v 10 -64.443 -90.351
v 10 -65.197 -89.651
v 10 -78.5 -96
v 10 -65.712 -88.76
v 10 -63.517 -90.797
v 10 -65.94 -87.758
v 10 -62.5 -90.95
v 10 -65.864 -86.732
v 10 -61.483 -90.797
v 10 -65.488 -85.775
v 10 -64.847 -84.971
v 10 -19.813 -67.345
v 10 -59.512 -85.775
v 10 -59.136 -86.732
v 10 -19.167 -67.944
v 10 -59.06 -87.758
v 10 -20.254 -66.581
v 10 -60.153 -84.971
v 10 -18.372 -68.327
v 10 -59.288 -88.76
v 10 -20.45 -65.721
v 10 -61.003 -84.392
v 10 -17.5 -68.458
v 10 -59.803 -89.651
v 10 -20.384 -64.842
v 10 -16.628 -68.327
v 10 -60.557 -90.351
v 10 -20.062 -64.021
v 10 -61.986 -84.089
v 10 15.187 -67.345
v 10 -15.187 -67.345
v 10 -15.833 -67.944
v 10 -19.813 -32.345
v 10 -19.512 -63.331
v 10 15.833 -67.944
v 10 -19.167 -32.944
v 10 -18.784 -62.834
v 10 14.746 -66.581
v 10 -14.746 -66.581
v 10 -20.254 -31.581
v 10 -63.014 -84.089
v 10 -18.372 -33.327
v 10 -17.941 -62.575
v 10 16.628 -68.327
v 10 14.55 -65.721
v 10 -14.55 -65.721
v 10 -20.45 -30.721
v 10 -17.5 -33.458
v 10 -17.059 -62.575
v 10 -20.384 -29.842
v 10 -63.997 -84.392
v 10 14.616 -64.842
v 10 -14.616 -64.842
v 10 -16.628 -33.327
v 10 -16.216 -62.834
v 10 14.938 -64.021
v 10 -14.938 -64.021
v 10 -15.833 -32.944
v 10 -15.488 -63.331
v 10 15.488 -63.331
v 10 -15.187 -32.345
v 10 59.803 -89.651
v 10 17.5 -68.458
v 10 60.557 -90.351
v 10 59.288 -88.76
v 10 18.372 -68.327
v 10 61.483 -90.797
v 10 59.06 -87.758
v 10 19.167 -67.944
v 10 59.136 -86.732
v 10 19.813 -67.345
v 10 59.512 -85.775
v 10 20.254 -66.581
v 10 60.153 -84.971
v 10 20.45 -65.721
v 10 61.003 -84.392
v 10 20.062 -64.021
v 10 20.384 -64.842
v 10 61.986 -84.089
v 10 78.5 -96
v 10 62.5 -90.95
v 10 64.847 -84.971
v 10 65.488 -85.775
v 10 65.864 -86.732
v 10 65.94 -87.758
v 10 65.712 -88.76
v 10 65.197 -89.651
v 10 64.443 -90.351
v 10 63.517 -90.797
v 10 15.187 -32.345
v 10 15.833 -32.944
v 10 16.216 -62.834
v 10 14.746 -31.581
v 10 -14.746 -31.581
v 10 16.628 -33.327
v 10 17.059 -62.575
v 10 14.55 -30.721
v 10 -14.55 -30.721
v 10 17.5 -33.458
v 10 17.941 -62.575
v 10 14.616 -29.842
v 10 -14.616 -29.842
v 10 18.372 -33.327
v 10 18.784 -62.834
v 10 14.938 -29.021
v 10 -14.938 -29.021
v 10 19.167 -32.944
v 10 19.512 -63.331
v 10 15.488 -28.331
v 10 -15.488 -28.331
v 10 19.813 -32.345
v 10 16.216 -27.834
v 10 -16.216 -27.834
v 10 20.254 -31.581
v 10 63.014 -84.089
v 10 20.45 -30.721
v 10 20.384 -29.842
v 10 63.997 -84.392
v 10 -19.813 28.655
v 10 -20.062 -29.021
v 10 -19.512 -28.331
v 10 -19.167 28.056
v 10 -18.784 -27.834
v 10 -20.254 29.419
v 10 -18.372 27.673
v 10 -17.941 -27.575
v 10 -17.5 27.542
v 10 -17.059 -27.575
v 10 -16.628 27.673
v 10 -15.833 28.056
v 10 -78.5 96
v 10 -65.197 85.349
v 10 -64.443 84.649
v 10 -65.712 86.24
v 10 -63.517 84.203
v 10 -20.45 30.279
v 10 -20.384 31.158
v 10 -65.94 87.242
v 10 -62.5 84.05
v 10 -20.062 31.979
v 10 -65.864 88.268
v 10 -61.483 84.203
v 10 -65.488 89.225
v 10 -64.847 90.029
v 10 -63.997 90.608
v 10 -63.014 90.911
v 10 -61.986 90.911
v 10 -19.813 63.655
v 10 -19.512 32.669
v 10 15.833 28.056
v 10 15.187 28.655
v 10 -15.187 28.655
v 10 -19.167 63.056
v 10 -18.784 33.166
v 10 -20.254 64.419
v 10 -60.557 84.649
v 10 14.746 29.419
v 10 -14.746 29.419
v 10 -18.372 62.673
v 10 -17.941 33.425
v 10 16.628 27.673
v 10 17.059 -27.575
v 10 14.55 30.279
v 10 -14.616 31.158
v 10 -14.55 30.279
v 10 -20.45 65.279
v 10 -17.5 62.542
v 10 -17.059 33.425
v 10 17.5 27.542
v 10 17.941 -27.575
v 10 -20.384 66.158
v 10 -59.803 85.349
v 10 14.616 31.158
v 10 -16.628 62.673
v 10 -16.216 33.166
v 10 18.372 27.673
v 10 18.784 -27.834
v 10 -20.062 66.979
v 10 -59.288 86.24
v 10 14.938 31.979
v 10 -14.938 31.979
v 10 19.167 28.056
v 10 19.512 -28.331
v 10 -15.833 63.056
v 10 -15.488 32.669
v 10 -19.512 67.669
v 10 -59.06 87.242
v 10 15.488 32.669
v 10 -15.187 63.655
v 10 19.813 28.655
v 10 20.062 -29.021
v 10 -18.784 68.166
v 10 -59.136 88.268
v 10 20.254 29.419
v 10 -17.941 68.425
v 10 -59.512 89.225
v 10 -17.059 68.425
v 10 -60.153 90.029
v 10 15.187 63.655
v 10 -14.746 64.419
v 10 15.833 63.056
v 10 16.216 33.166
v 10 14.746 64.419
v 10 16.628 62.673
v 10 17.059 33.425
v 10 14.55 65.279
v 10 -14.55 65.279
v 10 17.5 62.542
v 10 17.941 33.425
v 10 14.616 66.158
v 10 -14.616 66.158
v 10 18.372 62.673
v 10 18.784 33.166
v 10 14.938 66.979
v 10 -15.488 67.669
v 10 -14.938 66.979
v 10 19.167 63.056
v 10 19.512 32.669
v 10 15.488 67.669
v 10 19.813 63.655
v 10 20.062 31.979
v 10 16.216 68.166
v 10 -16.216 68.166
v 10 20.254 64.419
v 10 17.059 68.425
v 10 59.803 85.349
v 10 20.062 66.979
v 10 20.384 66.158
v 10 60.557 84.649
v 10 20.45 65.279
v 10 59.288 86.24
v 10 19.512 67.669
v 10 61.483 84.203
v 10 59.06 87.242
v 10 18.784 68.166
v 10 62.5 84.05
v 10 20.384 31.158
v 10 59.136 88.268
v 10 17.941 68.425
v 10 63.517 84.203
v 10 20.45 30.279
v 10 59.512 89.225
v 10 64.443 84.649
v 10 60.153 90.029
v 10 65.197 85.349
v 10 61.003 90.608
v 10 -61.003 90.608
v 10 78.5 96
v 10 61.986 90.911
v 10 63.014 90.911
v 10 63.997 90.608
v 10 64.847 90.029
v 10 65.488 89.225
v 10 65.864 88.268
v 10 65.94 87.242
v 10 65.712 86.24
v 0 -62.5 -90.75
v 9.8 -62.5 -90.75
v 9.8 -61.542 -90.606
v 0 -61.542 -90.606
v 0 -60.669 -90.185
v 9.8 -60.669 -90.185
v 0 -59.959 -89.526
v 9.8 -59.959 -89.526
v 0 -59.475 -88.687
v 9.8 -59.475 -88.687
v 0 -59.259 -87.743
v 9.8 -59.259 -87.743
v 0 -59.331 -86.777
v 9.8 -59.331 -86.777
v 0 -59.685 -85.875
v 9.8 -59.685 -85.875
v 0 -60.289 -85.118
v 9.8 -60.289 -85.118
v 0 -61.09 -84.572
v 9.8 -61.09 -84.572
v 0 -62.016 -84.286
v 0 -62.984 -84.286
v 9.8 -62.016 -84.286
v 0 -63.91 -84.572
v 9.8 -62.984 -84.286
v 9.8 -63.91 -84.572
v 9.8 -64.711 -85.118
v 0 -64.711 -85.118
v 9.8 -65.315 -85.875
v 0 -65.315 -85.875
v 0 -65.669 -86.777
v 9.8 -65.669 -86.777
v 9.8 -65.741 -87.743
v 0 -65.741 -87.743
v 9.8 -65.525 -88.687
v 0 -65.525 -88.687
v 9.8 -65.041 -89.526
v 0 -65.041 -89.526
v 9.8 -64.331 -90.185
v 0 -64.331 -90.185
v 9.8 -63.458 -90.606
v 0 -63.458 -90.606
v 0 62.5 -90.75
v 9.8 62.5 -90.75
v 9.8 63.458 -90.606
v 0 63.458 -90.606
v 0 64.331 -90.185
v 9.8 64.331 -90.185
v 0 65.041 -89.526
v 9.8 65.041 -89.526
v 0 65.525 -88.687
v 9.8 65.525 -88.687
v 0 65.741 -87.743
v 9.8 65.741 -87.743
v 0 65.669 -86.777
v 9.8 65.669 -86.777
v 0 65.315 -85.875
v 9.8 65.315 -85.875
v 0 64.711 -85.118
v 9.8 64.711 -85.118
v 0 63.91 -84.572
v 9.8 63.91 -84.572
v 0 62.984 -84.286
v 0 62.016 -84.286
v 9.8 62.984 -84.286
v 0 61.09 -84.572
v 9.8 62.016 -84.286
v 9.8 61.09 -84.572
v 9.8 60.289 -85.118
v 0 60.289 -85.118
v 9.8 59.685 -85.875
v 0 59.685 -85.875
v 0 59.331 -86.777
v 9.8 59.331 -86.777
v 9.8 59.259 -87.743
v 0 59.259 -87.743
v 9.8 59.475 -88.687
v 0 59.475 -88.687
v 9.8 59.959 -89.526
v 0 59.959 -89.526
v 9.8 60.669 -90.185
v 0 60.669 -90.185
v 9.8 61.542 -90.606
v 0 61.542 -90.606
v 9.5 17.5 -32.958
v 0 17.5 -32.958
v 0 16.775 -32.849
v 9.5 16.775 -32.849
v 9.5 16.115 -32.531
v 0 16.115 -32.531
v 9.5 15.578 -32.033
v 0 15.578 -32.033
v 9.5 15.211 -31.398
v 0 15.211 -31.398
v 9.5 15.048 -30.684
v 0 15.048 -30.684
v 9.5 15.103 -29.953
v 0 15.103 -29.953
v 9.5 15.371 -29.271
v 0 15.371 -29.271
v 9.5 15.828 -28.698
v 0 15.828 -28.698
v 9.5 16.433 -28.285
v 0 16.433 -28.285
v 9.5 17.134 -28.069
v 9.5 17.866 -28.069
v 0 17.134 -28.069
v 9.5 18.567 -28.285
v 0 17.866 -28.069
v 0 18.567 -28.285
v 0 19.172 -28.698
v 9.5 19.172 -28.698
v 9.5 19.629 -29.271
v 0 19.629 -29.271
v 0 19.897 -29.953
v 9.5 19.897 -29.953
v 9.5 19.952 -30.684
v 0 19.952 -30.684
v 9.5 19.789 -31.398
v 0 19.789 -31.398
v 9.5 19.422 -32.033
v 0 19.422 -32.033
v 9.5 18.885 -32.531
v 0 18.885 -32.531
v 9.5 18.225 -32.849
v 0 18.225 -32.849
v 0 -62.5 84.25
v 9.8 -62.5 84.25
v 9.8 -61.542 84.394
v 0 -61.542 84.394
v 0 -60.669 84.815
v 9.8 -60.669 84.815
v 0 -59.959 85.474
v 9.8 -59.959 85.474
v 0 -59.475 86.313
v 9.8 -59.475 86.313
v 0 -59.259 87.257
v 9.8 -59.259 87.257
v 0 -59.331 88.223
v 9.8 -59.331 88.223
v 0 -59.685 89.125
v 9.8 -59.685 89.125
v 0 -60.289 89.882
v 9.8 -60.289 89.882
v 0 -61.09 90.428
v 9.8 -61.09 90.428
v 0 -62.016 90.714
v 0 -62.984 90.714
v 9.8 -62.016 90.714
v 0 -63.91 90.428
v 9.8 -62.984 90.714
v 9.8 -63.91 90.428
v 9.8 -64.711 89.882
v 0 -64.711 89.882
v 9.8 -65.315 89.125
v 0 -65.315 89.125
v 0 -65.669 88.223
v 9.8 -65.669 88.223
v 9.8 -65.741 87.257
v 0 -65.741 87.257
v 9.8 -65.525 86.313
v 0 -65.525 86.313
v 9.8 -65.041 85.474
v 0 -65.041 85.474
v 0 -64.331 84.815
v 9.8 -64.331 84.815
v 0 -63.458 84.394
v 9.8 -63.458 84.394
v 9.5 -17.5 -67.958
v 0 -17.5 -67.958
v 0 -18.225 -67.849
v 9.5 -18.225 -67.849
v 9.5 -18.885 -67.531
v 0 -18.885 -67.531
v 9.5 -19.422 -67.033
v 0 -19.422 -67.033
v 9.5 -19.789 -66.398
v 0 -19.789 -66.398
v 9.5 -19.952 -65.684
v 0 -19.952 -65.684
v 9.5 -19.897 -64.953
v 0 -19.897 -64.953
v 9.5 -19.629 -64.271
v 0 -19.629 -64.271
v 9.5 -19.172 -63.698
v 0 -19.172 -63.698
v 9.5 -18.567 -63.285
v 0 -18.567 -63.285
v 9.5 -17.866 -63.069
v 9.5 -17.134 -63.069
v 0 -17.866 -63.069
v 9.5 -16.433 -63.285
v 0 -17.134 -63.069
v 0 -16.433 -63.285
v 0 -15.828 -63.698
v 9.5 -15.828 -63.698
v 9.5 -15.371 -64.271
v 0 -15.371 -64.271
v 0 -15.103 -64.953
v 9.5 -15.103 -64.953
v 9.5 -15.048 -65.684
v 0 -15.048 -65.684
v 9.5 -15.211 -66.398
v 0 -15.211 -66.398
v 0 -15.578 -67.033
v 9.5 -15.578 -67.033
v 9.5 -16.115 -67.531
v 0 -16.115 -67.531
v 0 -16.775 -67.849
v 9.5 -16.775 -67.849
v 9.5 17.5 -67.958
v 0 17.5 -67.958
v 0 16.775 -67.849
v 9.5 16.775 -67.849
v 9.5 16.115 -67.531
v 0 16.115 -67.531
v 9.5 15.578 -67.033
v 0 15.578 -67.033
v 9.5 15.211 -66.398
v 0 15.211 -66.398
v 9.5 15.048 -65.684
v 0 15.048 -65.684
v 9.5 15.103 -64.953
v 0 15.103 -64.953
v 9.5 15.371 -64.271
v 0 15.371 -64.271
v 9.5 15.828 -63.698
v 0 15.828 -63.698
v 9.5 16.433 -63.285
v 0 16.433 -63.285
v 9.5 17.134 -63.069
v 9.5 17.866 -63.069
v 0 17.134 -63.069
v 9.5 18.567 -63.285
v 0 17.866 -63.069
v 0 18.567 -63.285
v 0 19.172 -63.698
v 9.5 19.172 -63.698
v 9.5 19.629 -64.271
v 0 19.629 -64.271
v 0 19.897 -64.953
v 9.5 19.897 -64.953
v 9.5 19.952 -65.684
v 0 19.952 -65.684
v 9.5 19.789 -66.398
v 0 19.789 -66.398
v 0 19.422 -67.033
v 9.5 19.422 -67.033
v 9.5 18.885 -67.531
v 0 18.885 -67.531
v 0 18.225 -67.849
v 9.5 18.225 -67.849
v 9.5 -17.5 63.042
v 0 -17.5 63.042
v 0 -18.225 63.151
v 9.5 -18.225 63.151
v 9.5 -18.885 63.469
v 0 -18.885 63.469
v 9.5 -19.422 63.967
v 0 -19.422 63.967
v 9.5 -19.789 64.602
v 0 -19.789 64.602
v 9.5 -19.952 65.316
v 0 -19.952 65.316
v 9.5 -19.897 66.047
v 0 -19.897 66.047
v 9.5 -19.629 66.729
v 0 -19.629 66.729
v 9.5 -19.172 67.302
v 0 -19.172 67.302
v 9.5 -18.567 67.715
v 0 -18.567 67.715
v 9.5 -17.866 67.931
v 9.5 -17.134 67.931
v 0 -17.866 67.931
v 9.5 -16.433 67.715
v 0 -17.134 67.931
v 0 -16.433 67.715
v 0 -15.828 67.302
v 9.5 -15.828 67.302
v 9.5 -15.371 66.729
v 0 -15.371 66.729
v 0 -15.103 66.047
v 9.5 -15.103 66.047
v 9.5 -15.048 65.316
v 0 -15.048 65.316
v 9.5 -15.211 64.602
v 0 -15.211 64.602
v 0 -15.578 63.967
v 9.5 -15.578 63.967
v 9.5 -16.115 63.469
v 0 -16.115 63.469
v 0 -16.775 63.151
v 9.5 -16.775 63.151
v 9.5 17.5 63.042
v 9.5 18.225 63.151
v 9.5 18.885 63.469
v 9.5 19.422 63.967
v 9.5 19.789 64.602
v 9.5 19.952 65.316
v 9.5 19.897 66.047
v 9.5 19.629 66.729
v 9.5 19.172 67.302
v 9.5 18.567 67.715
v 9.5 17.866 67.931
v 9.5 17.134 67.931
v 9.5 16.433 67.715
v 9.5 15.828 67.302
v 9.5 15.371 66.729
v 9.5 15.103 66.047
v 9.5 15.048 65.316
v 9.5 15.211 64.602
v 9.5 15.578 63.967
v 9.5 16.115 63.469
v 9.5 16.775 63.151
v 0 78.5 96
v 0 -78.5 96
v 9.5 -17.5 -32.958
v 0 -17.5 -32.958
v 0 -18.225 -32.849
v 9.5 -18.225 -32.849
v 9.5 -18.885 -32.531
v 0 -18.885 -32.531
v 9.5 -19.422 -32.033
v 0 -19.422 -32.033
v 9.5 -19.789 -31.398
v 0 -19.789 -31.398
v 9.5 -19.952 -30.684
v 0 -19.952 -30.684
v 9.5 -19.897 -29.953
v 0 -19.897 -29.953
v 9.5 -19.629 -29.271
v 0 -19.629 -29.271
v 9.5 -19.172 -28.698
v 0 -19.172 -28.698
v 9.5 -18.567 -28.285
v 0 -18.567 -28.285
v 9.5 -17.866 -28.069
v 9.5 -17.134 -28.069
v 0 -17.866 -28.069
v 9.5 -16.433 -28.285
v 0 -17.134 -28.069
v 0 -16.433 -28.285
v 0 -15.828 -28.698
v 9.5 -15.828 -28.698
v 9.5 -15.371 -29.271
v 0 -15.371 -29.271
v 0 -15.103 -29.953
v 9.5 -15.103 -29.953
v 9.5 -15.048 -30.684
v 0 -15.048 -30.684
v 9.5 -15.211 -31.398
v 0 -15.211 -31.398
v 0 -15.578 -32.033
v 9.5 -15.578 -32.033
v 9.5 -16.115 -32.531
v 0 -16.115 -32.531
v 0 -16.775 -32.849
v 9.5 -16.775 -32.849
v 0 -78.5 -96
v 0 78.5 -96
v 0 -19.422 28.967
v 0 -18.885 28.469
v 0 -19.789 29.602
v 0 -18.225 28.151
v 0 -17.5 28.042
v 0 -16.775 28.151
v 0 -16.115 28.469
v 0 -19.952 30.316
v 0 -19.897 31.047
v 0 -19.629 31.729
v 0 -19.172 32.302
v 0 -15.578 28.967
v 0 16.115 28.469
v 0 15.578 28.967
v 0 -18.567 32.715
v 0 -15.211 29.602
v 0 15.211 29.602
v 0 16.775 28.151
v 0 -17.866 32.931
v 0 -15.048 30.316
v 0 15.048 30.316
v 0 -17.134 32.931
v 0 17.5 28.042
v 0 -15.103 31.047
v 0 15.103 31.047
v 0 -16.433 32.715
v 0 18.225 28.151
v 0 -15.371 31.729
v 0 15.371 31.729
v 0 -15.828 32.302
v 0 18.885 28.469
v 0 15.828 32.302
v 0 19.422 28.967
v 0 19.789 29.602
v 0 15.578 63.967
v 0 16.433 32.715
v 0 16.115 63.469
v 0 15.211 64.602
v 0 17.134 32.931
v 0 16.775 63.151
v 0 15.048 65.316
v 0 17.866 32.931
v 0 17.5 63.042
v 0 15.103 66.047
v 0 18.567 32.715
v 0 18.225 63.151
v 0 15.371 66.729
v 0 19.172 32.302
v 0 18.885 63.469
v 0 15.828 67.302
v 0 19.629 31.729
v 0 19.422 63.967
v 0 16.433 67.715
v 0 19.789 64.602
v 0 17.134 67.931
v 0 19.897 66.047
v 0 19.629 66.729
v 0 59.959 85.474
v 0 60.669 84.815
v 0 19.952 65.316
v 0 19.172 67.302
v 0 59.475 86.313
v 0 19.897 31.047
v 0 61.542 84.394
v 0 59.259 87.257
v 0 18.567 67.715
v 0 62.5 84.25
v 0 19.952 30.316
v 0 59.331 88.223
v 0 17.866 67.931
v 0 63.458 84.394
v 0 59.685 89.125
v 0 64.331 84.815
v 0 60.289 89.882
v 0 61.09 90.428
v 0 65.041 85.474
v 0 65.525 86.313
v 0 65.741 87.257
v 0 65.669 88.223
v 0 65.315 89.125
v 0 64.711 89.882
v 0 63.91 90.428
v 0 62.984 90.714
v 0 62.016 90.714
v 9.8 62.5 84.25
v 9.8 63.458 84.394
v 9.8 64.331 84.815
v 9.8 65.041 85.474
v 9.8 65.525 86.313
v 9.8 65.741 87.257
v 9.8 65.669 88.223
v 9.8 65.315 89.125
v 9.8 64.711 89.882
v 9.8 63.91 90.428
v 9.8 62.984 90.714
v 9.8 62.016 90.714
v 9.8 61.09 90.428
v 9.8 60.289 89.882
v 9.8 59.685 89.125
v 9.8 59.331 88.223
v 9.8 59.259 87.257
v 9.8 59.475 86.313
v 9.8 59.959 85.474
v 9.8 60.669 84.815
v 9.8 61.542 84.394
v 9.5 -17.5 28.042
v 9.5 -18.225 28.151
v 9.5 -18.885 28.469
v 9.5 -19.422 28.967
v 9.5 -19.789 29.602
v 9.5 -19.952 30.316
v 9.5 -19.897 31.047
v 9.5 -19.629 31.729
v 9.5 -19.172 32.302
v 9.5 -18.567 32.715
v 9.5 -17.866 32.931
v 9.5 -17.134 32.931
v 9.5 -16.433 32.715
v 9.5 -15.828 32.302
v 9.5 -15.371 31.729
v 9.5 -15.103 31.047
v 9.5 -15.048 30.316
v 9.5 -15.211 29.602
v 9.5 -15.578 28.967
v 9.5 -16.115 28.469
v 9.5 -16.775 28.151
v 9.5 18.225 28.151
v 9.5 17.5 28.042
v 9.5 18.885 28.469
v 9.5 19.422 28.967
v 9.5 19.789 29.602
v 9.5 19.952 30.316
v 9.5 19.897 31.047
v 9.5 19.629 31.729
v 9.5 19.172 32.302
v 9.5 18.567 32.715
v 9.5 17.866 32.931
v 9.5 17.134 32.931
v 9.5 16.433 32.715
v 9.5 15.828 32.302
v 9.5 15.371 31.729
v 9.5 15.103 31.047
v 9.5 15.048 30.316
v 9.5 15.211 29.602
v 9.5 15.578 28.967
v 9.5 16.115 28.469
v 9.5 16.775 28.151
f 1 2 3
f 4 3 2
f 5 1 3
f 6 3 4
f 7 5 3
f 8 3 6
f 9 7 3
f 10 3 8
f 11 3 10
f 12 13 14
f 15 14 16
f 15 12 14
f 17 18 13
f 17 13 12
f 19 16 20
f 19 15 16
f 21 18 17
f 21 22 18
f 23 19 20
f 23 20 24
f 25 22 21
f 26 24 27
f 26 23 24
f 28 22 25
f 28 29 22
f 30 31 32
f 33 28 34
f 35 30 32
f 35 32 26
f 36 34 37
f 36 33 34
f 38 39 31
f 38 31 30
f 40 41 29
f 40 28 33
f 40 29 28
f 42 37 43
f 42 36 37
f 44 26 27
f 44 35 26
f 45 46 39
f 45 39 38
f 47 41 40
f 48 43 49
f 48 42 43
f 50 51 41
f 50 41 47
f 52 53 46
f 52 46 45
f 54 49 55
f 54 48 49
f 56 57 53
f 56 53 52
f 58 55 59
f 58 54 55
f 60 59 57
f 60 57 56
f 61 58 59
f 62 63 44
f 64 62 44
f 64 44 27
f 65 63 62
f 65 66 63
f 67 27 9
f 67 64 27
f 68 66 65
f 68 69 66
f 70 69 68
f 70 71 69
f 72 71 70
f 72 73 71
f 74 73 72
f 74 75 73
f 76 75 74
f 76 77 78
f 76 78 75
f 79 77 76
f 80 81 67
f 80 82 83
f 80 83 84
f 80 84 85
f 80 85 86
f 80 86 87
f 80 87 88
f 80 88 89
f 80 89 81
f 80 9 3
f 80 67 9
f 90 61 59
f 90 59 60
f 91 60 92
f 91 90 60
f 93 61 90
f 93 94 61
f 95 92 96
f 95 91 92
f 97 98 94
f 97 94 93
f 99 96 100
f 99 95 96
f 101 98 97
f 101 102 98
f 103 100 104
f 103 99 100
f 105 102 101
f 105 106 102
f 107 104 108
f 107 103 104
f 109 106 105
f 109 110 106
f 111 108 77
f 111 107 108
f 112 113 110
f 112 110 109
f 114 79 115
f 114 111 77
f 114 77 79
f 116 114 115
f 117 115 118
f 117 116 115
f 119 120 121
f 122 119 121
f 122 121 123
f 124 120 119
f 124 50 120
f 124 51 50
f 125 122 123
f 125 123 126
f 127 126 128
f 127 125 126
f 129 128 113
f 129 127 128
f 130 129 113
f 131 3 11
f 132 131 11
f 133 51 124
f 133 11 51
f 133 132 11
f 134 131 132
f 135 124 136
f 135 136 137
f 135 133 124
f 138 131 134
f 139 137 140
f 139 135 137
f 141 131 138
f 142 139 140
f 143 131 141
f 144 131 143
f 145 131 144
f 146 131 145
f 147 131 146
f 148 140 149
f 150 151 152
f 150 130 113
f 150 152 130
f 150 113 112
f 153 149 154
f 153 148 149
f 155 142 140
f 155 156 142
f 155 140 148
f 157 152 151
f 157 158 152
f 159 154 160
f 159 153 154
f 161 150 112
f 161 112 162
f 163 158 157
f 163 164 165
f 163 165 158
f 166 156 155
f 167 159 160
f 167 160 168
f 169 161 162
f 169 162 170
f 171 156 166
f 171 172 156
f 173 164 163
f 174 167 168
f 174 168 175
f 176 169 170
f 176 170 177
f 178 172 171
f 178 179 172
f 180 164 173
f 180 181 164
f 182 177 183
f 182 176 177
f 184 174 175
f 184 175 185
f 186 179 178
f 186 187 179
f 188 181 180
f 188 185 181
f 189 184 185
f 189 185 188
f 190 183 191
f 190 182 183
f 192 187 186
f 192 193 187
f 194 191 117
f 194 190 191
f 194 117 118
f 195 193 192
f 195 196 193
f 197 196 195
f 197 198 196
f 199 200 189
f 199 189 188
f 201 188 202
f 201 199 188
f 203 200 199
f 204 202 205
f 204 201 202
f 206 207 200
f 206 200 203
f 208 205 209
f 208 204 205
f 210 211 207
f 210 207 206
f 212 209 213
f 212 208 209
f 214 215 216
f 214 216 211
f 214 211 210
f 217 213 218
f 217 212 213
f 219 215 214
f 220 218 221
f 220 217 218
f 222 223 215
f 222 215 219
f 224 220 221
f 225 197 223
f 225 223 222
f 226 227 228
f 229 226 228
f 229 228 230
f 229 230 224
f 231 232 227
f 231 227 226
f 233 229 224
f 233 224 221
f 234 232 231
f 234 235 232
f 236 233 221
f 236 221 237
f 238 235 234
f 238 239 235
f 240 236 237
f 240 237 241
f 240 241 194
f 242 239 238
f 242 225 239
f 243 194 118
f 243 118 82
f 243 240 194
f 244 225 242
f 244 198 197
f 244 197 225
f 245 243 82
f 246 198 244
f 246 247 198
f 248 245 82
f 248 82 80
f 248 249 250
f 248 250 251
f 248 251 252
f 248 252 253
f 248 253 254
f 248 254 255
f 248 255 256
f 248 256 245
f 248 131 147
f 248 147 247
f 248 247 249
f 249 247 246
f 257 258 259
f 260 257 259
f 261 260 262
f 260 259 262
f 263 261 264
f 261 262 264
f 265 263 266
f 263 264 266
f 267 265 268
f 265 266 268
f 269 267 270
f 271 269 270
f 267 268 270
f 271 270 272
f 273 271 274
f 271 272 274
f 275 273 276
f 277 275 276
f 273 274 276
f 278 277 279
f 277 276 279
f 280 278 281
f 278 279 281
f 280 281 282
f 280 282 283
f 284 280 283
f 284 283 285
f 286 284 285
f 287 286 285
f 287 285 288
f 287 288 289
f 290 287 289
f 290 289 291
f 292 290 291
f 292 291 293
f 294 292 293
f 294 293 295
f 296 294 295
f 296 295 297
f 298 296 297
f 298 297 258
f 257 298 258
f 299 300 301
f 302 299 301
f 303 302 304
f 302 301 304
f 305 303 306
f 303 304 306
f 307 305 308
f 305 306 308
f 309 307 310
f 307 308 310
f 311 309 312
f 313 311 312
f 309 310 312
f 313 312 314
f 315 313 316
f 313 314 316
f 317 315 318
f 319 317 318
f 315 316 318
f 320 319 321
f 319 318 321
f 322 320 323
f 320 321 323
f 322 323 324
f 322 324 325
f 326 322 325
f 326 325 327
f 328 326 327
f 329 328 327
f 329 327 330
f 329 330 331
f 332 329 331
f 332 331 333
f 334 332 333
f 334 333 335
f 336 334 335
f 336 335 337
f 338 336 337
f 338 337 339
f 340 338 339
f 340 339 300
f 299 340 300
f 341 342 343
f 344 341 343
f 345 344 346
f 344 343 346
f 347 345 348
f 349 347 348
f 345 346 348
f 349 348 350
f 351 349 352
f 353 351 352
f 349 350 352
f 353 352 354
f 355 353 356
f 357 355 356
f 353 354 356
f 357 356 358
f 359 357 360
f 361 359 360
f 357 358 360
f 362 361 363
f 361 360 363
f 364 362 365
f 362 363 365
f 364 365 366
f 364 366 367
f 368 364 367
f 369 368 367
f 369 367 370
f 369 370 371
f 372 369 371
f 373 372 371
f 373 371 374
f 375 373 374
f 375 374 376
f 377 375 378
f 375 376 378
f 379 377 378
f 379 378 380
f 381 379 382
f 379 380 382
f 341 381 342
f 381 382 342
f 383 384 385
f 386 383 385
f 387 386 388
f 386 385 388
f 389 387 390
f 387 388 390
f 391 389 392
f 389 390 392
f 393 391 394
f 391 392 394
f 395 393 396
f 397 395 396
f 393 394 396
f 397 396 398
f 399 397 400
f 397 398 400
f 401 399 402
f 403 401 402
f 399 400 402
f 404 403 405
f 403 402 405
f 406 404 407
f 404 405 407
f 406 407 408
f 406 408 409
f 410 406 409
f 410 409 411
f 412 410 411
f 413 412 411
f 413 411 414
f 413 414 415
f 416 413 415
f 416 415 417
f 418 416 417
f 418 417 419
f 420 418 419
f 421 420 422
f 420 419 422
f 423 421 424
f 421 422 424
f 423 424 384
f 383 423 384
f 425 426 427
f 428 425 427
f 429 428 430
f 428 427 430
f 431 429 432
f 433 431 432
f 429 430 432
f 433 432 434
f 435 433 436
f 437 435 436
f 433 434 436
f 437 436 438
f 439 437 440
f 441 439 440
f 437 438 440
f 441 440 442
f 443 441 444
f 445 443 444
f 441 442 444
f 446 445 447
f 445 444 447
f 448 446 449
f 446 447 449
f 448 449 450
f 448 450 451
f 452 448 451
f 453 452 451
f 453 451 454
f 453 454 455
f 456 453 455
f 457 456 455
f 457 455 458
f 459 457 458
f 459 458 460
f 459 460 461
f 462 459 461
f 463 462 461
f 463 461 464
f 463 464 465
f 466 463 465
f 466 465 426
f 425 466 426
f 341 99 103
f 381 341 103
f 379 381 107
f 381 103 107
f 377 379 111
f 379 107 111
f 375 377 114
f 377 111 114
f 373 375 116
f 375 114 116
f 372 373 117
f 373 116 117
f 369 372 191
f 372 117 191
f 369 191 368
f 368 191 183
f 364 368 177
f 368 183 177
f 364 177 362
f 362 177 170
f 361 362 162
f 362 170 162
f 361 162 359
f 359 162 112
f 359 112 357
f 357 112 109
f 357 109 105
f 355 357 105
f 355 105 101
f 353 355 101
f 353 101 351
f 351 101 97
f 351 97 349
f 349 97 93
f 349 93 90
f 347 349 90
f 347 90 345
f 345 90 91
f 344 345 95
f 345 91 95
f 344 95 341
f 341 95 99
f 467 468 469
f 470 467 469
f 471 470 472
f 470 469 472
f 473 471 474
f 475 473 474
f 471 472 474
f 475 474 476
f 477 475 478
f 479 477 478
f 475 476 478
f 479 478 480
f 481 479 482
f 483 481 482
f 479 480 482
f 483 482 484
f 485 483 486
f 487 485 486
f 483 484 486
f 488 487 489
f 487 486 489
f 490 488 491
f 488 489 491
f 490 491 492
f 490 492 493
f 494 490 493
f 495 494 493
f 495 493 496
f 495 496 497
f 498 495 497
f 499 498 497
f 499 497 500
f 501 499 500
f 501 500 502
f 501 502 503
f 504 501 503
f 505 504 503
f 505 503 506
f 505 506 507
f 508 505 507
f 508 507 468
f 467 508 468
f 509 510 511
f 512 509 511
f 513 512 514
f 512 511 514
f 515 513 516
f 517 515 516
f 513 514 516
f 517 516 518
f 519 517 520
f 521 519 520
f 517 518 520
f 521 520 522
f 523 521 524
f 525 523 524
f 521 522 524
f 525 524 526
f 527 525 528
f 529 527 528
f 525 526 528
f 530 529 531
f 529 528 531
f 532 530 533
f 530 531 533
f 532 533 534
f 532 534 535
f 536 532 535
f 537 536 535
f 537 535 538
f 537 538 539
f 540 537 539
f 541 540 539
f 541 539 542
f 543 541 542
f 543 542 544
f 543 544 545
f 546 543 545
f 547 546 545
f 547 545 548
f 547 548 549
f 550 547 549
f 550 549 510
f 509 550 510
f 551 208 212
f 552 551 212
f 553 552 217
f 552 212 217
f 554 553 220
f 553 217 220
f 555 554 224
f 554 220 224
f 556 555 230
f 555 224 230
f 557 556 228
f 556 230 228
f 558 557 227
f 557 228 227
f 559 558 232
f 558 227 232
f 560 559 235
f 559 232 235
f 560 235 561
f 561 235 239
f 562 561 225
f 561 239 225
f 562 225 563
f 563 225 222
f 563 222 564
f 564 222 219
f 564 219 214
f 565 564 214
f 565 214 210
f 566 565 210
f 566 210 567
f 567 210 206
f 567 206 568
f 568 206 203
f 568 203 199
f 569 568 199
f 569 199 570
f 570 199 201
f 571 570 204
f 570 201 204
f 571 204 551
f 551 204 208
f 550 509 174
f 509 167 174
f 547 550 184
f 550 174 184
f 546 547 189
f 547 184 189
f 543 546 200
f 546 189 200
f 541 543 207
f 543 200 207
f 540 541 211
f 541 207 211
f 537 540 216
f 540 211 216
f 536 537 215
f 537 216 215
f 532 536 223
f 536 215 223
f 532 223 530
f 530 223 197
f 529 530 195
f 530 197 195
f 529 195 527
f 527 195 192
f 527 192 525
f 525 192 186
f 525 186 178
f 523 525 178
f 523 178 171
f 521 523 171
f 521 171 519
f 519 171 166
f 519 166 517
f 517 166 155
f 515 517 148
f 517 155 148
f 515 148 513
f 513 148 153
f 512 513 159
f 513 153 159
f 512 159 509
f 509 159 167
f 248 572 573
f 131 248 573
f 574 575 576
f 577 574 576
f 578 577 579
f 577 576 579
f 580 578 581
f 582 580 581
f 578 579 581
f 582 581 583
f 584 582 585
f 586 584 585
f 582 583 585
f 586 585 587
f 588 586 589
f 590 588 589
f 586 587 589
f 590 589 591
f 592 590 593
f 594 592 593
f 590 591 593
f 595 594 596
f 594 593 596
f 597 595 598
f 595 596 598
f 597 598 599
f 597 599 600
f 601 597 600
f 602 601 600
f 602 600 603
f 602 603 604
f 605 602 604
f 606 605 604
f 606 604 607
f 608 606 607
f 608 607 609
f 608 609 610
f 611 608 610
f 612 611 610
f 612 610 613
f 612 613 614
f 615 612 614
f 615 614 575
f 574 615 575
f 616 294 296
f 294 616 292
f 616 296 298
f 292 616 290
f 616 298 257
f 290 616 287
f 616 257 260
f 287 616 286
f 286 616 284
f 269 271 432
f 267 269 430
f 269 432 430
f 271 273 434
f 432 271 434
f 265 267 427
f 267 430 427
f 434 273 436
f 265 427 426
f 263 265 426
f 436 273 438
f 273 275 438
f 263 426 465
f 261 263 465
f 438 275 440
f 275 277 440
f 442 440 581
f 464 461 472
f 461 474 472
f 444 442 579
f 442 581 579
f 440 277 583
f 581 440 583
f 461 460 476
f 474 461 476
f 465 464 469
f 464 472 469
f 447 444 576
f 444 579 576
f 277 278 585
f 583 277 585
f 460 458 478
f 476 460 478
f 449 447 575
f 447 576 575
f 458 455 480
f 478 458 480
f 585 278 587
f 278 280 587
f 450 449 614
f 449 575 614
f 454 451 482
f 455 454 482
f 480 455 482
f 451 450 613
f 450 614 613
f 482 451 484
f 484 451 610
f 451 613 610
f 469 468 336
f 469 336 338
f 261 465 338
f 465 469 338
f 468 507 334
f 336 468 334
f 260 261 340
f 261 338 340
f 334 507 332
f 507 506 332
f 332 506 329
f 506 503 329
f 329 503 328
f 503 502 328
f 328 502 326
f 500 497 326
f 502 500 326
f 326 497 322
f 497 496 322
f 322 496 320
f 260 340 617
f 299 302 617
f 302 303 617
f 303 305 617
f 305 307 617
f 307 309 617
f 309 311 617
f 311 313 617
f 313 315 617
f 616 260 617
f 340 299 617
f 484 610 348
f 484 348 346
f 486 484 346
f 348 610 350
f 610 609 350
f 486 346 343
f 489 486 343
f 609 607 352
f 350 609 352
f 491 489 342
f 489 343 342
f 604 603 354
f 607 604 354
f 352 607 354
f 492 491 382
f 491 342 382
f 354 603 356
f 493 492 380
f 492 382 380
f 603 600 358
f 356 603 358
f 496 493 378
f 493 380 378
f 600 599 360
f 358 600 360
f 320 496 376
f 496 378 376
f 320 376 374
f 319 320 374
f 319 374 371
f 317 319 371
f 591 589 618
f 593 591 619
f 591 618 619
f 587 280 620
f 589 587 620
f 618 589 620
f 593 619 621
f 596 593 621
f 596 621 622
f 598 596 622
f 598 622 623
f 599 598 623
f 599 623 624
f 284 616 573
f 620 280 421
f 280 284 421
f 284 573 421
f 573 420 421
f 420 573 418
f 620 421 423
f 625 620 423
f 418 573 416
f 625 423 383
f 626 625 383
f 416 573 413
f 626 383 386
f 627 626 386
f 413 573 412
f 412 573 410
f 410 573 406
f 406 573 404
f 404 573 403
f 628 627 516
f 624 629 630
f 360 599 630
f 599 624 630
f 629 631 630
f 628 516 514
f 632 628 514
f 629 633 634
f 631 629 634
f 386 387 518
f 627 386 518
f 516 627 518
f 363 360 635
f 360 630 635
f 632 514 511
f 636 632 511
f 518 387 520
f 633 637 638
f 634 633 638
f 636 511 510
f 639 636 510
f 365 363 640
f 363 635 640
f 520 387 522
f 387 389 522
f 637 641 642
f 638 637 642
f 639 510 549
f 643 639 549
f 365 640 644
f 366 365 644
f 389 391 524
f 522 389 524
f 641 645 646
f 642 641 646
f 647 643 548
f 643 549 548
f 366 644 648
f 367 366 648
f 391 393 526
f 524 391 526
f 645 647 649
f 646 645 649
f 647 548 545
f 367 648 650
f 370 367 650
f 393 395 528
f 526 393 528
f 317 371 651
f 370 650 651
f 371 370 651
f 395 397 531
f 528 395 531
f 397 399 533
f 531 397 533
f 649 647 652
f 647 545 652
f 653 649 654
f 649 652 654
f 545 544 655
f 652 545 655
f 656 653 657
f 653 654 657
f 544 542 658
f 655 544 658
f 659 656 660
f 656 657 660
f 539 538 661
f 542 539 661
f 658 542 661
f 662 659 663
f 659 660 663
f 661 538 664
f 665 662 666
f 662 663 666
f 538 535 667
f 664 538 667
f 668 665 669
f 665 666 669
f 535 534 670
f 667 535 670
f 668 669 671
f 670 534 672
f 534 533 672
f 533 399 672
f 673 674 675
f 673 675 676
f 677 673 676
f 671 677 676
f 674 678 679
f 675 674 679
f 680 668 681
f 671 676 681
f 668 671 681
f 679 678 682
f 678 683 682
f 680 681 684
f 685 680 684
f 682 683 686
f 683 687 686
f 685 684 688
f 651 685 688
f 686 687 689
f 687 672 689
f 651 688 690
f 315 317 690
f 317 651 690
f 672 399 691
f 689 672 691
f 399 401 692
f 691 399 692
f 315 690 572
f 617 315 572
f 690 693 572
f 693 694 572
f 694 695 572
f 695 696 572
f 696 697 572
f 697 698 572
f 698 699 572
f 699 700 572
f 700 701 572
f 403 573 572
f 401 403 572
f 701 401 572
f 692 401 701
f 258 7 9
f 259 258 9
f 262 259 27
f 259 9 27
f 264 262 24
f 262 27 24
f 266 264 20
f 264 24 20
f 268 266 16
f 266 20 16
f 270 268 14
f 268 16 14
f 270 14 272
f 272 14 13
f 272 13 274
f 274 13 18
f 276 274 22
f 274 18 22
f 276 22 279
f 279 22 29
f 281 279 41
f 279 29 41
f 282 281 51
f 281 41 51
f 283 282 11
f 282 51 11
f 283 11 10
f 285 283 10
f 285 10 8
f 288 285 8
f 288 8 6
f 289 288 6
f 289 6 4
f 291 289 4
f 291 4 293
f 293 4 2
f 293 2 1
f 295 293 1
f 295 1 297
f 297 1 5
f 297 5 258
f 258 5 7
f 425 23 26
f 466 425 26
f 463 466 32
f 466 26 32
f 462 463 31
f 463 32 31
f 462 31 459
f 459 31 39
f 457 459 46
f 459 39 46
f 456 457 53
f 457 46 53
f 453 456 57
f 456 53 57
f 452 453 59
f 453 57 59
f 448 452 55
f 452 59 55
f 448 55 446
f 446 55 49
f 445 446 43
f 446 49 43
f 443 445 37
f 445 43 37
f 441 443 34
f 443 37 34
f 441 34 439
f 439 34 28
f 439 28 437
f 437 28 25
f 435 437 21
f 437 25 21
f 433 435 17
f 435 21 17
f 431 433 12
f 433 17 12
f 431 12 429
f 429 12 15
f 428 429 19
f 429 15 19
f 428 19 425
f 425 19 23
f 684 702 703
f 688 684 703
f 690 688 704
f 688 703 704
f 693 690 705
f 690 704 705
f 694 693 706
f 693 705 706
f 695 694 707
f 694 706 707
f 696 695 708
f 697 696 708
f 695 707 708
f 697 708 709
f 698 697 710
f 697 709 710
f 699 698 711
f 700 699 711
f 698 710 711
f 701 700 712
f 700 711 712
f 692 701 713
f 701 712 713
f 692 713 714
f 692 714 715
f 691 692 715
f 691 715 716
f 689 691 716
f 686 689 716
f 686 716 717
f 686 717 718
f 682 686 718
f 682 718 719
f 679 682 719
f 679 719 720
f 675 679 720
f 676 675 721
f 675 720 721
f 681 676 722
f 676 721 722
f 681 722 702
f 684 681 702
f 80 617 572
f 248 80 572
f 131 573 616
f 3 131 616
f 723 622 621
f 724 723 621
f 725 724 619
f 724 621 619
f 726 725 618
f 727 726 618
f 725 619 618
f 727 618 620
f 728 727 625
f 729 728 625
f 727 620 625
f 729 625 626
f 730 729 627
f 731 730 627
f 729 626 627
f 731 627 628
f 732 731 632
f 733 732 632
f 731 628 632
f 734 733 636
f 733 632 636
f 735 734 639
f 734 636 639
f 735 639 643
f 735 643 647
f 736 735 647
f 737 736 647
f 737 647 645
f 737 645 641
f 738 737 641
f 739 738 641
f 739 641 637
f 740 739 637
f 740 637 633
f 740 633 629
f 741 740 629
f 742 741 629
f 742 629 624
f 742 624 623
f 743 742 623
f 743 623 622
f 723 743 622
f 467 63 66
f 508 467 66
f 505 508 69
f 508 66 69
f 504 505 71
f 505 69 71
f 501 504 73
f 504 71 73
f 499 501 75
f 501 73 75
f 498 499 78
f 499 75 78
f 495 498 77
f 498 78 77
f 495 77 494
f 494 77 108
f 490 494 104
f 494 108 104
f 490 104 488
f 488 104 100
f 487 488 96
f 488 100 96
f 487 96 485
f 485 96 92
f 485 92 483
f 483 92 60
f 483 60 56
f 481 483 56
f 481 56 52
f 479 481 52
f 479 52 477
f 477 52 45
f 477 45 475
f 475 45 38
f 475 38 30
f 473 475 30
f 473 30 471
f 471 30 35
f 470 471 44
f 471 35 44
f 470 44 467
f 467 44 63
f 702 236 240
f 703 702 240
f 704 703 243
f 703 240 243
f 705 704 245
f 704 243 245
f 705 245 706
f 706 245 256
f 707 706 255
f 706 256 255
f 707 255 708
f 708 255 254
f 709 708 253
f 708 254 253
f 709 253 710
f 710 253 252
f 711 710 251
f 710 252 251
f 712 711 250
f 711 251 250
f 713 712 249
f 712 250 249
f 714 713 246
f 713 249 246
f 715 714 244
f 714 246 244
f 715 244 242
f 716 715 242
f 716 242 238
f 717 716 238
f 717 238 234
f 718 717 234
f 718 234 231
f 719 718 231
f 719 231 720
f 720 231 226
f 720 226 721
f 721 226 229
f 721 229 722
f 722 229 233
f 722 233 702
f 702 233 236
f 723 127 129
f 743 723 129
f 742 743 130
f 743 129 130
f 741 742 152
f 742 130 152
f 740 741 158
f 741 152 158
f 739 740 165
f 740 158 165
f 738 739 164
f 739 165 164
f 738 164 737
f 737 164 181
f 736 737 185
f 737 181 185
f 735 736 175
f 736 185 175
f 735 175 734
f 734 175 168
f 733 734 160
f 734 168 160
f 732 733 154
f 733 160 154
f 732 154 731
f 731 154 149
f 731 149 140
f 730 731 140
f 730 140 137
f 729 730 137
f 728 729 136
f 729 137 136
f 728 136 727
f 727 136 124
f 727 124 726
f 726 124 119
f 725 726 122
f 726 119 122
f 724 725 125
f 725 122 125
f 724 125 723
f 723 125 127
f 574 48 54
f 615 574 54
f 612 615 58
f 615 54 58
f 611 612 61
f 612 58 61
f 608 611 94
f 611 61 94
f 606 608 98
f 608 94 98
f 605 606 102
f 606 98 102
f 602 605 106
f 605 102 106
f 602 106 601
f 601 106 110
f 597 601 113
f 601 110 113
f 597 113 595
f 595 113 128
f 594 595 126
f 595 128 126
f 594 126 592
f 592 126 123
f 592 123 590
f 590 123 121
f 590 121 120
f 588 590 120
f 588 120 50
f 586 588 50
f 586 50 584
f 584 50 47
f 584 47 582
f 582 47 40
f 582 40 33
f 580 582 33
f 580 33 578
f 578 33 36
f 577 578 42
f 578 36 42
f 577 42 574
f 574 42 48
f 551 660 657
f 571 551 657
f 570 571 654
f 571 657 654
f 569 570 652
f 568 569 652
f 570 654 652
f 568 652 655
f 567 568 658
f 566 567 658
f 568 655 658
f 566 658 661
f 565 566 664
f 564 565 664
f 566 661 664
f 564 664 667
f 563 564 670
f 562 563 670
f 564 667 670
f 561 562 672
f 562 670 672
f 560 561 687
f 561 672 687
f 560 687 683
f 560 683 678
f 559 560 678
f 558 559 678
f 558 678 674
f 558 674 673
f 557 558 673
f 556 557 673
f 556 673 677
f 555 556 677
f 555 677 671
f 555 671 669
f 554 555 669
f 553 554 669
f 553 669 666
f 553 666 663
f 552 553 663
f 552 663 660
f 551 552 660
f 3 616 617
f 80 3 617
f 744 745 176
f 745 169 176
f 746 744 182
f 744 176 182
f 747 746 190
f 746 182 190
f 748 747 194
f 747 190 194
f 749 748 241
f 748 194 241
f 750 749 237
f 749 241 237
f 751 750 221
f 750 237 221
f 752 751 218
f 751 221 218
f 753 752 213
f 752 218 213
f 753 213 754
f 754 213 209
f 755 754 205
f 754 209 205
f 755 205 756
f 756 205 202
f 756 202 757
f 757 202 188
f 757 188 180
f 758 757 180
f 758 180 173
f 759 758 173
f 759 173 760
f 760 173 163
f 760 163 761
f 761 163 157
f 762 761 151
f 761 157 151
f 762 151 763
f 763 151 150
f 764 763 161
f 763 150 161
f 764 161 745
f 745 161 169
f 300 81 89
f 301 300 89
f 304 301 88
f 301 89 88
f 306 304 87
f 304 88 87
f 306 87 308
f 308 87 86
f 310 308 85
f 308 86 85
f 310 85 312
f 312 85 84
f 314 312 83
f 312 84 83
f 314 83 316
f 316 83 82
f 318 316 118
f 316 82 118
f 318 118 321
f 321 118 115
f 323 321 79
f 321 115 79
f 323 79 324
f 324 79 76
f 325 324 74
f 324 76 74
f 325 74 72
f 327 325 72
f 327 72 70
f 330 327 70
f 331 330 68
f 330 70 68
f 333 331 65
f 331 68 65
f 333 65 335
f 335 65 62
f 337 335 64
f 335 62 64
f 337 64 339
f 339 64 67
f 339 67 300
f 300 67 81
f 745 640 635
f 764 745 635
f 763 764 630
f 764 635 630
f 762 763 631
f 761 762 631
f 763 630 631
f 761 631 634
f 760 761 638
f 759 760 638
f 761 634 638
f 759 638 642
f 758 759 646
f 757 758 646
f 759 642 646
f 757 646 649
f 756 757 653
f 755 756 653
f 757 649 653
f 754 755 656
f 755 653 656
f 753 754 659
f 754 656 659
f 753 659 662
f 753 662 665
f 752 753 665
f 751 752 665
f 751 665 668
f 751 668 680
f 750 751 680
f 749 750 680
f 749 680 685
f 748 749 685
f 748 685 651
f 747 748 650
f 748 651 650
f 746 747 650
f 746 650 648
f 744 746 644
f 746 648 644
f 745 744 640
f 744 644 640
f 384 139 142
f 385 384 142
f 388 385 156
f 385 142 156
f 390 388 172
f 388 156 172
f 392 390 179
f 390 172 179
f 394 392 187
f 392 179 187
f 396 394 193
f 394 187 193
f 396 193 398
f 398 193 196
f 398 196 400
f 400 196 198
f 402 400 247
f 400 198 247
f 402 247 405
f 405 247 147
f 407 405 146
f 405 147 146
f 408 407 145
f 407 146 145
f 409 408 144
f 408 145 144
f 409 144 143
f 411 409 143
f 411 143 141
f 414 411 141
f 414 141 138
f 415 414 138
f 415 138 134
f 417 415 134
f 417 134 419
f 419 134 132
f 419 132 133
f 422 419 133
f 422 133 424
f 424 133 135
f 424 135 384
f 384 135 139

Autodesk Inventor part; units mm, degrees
ref_plane "YZ Plane" through (0, 0, 0) normal (1, 0, 0) x (0, 1, 0)
ref_plane "XZ Plane" through (0, 0, 0) normal (0, 1, 0) x (-1, 0, 0)
ref_plane "XY Plane" through (0, 0, 0) normal (0, 0, 1) x (1, 0, 0)
sketch "Skizze1" plane through (0, 0, 0) normal (1, 0, 0) x (0, 1, 0)
  line L0 (78.5, 96) -> (-78.5, 96)
  line L1 (-78.5, 96) -> (-78.5, -96)
  line L2 (-78.5, -96) -> (78.5, -96)
  line L3 (78.5, -96) -> (78.5, 96)
  point P0 (0, 0)
  dimension "d0" = 192
  dimension "d1" = 157
  dimension "d2" = 78.5
  dimension "d3" = 96
extrude "Extrusion1" add sketch "Skizze1" along normal blind 10
sketch "草图5" plane through (0, 0, 0) normal (-1, 0, 0) x (0, 0, 1)
  point P0 (0, 0)
sketch "草图6" plane through (10, 0, 0) normal (1, 0, 0) x (0, 0, -1)
  line L0 (-24, 25) -> (-72, 25)
  line L1 (-72, 25) -> (-72, -25)
  line L2 (-72, -25) -> (-24, -25)
  line L3 (-24, -25) -> (-24, 25)
  line L4 (-24, 25) -> (-72, -25) construction
  line L5 (-72, 25) -> (-24, -25) construction
  line L6 (-96, 78.5) -> (-96, -78.5) projected
  line L7 (-65.5, -17.5) -> (-30.5, -17.5)
  line L8 (-30.5, -17.5) -> (-30.5, 17.5)
  line L9 (-30.5, 17.5) -> (-65.5, 17.5)
  line L10 (-65.5, 17.5) -> (-65.5, -17.5)
  line L11 (-65.5, -17.5) -> (-30.5, 17.5) construction
  line L12 (-30.5, -17.5) -> (-65.5, 17.5) construction
  circle A0 centre (-65.5, -17.5) radius 2.5
  circle A1 centre (-30.5, -17.5) radius 2.5
  circle A2 centre (-30.5, 17.5) radius 2.5
  circle A3 centre (-65.5, 17.5) radius 2.5
  line L13 (24, 25) -> (72, 25)
  line L14 (72, 25) -> (72, -25)
  line L15 (72, -25) -> (24, -25)
  line L16 (24, -25) -> (24, 25)
  line L17 (24, 25) -> (72, -25) construction
  line L18 (72, 25) -> (24, -25) construction
  line L19 (65.5, -17.5) -> (30.5, -17.5)
  line L20 (30.5, -17.5) -> (30.5, 17.5)
  line L21 (30.5, 17.5) -> (65.5, 17.5)
  line L22 (65.5, 17.5) -> (65.5, -17.5)
  line L23 (65.5, -17.5) -> (30.5, 17.5) construction
  line L24 (30.5, -17.5) -> (65.5, 17.5) construction
  circle A4 centre (65.5, -17.5) radius 2.5
  circle A5 centre (30.5, -17.5) radius 2.5
  circle A6 centre (30.5, 17.5) radius 2.5
  circle A7 centre (65.5, 17.5) radius 2.5
  point P0 (0, 0)
  point P1 (-48, 0)
  point P2 (-48, 0)
  point P3 (48, 0)
  point P4 (48, 0)
  dimension "d31" = 50
  dimension "d32" = 48
  dimension "d33" = 24
  dimension "d34" = 35
  dimension "d35" = 35
  dimension "d36" = 5
  dimension "d39" = 360
  dimension "d48" = 5
  dimension "d49" = 5
  dimension "d50" = 5
  dimension "d51" = 5
hole "孔1" at (10, -17.5, 65.5) at (10, 17.5, 65.5) at (10, -17.5, 30.5) at (10, -17.5, -30.5) at (10, 17.5, -30.5) at (10, 17.5, -65.5) at (10, -17.5, -65.5) at (10, 17.5, 65.5) at (10, 17.5, 30.5) direction (-1, 0, 0) diameter 4.917 end through all thread size "M6x1" class "6H" standard "ISO Metric profile"
chamfer "倒角1" distance 0.5 angle 45 8 edges at (10, -17.5, -63.0415) (10, -17.5, -28.0415) (10, 17.5, -63.0415) (10, 17.5, -28.0415) (10, -17.5, 32.9585) (10, -17.5, 67.9585) (10, 17.5, 32.9585) (10, 17.5, 67.9585)
sketch "草图10" plane through (10, 0, 0) normal (1, 0, 0) x (0, 0, -1)
  line L0 (-169, 0) -> (145, 0)
  line L1 (0, 114) -> (0, -130)
  line L2 (-96, 78.5) -> (-96, -78.5) projected
  line L3 (-87.5, 62.5) -> (87.5, 62.5)
  line L4 (87.5, 62.5) -> (87.5, -62.5)
  line L5 (87.5, -62.5) -> (-87.5, -62.5)
  line L6 (-87.5, -62.5) -> (-87.5, 62.5)
  line L7 (-87.5, 62.5) -> (87.5, -62.5) construction
  line L8 (87.5, 62.5) -> (-87.5, -62.5) construction
  circle A0 centre (-87.5, 62.5) radius 3.25
  circle A1 centre (-87.5, -62.5) radius 3.25
  circle A2 centre (87.5, 62.5) radius 3.25
  circle A3 centre (87.5, -62.5) radius 3.25
  point P0 (0, 0)
  dimension "d74" = 96
  dimension "d75" = 175
  dimension "d76" = 125
  dimension "d77" = 6.5
extrude "拉伸5" cut sketch "草图10" against normal blind 10 contours A1 L5 L6 | L6 L5 A1 | A0 L3 L6 | L6 L3 A0 | A2 L3 L4 | L4 L3 A2 | A3 L5 L4 | L4 L5 A3
thread "螺纹6" size "M7x1" class "6H" standard "ANSI Metric M Profile" length 10
thread "螺纹7" size "M7x1" class "6H" standard "ANSI Metric M Profile" length 10
thread "螺纹8" size "M7x1" class "6H" standard "ANSI Metric M Profile" length 10
thread "螺纹9" size "M7x1" class "6H" standard "ANSI Metric M Profile" length 10
chamfer "倒角4" distance 0.2 angle 45 4 edges at (10, -62.5, 90.75) (10, -62.5, -84.25) (10, 62.5, -84.25) (10, 62.5, 90.75)
properties part number "Adapterplatte1Gong_2025-03-28v00r00grm"
